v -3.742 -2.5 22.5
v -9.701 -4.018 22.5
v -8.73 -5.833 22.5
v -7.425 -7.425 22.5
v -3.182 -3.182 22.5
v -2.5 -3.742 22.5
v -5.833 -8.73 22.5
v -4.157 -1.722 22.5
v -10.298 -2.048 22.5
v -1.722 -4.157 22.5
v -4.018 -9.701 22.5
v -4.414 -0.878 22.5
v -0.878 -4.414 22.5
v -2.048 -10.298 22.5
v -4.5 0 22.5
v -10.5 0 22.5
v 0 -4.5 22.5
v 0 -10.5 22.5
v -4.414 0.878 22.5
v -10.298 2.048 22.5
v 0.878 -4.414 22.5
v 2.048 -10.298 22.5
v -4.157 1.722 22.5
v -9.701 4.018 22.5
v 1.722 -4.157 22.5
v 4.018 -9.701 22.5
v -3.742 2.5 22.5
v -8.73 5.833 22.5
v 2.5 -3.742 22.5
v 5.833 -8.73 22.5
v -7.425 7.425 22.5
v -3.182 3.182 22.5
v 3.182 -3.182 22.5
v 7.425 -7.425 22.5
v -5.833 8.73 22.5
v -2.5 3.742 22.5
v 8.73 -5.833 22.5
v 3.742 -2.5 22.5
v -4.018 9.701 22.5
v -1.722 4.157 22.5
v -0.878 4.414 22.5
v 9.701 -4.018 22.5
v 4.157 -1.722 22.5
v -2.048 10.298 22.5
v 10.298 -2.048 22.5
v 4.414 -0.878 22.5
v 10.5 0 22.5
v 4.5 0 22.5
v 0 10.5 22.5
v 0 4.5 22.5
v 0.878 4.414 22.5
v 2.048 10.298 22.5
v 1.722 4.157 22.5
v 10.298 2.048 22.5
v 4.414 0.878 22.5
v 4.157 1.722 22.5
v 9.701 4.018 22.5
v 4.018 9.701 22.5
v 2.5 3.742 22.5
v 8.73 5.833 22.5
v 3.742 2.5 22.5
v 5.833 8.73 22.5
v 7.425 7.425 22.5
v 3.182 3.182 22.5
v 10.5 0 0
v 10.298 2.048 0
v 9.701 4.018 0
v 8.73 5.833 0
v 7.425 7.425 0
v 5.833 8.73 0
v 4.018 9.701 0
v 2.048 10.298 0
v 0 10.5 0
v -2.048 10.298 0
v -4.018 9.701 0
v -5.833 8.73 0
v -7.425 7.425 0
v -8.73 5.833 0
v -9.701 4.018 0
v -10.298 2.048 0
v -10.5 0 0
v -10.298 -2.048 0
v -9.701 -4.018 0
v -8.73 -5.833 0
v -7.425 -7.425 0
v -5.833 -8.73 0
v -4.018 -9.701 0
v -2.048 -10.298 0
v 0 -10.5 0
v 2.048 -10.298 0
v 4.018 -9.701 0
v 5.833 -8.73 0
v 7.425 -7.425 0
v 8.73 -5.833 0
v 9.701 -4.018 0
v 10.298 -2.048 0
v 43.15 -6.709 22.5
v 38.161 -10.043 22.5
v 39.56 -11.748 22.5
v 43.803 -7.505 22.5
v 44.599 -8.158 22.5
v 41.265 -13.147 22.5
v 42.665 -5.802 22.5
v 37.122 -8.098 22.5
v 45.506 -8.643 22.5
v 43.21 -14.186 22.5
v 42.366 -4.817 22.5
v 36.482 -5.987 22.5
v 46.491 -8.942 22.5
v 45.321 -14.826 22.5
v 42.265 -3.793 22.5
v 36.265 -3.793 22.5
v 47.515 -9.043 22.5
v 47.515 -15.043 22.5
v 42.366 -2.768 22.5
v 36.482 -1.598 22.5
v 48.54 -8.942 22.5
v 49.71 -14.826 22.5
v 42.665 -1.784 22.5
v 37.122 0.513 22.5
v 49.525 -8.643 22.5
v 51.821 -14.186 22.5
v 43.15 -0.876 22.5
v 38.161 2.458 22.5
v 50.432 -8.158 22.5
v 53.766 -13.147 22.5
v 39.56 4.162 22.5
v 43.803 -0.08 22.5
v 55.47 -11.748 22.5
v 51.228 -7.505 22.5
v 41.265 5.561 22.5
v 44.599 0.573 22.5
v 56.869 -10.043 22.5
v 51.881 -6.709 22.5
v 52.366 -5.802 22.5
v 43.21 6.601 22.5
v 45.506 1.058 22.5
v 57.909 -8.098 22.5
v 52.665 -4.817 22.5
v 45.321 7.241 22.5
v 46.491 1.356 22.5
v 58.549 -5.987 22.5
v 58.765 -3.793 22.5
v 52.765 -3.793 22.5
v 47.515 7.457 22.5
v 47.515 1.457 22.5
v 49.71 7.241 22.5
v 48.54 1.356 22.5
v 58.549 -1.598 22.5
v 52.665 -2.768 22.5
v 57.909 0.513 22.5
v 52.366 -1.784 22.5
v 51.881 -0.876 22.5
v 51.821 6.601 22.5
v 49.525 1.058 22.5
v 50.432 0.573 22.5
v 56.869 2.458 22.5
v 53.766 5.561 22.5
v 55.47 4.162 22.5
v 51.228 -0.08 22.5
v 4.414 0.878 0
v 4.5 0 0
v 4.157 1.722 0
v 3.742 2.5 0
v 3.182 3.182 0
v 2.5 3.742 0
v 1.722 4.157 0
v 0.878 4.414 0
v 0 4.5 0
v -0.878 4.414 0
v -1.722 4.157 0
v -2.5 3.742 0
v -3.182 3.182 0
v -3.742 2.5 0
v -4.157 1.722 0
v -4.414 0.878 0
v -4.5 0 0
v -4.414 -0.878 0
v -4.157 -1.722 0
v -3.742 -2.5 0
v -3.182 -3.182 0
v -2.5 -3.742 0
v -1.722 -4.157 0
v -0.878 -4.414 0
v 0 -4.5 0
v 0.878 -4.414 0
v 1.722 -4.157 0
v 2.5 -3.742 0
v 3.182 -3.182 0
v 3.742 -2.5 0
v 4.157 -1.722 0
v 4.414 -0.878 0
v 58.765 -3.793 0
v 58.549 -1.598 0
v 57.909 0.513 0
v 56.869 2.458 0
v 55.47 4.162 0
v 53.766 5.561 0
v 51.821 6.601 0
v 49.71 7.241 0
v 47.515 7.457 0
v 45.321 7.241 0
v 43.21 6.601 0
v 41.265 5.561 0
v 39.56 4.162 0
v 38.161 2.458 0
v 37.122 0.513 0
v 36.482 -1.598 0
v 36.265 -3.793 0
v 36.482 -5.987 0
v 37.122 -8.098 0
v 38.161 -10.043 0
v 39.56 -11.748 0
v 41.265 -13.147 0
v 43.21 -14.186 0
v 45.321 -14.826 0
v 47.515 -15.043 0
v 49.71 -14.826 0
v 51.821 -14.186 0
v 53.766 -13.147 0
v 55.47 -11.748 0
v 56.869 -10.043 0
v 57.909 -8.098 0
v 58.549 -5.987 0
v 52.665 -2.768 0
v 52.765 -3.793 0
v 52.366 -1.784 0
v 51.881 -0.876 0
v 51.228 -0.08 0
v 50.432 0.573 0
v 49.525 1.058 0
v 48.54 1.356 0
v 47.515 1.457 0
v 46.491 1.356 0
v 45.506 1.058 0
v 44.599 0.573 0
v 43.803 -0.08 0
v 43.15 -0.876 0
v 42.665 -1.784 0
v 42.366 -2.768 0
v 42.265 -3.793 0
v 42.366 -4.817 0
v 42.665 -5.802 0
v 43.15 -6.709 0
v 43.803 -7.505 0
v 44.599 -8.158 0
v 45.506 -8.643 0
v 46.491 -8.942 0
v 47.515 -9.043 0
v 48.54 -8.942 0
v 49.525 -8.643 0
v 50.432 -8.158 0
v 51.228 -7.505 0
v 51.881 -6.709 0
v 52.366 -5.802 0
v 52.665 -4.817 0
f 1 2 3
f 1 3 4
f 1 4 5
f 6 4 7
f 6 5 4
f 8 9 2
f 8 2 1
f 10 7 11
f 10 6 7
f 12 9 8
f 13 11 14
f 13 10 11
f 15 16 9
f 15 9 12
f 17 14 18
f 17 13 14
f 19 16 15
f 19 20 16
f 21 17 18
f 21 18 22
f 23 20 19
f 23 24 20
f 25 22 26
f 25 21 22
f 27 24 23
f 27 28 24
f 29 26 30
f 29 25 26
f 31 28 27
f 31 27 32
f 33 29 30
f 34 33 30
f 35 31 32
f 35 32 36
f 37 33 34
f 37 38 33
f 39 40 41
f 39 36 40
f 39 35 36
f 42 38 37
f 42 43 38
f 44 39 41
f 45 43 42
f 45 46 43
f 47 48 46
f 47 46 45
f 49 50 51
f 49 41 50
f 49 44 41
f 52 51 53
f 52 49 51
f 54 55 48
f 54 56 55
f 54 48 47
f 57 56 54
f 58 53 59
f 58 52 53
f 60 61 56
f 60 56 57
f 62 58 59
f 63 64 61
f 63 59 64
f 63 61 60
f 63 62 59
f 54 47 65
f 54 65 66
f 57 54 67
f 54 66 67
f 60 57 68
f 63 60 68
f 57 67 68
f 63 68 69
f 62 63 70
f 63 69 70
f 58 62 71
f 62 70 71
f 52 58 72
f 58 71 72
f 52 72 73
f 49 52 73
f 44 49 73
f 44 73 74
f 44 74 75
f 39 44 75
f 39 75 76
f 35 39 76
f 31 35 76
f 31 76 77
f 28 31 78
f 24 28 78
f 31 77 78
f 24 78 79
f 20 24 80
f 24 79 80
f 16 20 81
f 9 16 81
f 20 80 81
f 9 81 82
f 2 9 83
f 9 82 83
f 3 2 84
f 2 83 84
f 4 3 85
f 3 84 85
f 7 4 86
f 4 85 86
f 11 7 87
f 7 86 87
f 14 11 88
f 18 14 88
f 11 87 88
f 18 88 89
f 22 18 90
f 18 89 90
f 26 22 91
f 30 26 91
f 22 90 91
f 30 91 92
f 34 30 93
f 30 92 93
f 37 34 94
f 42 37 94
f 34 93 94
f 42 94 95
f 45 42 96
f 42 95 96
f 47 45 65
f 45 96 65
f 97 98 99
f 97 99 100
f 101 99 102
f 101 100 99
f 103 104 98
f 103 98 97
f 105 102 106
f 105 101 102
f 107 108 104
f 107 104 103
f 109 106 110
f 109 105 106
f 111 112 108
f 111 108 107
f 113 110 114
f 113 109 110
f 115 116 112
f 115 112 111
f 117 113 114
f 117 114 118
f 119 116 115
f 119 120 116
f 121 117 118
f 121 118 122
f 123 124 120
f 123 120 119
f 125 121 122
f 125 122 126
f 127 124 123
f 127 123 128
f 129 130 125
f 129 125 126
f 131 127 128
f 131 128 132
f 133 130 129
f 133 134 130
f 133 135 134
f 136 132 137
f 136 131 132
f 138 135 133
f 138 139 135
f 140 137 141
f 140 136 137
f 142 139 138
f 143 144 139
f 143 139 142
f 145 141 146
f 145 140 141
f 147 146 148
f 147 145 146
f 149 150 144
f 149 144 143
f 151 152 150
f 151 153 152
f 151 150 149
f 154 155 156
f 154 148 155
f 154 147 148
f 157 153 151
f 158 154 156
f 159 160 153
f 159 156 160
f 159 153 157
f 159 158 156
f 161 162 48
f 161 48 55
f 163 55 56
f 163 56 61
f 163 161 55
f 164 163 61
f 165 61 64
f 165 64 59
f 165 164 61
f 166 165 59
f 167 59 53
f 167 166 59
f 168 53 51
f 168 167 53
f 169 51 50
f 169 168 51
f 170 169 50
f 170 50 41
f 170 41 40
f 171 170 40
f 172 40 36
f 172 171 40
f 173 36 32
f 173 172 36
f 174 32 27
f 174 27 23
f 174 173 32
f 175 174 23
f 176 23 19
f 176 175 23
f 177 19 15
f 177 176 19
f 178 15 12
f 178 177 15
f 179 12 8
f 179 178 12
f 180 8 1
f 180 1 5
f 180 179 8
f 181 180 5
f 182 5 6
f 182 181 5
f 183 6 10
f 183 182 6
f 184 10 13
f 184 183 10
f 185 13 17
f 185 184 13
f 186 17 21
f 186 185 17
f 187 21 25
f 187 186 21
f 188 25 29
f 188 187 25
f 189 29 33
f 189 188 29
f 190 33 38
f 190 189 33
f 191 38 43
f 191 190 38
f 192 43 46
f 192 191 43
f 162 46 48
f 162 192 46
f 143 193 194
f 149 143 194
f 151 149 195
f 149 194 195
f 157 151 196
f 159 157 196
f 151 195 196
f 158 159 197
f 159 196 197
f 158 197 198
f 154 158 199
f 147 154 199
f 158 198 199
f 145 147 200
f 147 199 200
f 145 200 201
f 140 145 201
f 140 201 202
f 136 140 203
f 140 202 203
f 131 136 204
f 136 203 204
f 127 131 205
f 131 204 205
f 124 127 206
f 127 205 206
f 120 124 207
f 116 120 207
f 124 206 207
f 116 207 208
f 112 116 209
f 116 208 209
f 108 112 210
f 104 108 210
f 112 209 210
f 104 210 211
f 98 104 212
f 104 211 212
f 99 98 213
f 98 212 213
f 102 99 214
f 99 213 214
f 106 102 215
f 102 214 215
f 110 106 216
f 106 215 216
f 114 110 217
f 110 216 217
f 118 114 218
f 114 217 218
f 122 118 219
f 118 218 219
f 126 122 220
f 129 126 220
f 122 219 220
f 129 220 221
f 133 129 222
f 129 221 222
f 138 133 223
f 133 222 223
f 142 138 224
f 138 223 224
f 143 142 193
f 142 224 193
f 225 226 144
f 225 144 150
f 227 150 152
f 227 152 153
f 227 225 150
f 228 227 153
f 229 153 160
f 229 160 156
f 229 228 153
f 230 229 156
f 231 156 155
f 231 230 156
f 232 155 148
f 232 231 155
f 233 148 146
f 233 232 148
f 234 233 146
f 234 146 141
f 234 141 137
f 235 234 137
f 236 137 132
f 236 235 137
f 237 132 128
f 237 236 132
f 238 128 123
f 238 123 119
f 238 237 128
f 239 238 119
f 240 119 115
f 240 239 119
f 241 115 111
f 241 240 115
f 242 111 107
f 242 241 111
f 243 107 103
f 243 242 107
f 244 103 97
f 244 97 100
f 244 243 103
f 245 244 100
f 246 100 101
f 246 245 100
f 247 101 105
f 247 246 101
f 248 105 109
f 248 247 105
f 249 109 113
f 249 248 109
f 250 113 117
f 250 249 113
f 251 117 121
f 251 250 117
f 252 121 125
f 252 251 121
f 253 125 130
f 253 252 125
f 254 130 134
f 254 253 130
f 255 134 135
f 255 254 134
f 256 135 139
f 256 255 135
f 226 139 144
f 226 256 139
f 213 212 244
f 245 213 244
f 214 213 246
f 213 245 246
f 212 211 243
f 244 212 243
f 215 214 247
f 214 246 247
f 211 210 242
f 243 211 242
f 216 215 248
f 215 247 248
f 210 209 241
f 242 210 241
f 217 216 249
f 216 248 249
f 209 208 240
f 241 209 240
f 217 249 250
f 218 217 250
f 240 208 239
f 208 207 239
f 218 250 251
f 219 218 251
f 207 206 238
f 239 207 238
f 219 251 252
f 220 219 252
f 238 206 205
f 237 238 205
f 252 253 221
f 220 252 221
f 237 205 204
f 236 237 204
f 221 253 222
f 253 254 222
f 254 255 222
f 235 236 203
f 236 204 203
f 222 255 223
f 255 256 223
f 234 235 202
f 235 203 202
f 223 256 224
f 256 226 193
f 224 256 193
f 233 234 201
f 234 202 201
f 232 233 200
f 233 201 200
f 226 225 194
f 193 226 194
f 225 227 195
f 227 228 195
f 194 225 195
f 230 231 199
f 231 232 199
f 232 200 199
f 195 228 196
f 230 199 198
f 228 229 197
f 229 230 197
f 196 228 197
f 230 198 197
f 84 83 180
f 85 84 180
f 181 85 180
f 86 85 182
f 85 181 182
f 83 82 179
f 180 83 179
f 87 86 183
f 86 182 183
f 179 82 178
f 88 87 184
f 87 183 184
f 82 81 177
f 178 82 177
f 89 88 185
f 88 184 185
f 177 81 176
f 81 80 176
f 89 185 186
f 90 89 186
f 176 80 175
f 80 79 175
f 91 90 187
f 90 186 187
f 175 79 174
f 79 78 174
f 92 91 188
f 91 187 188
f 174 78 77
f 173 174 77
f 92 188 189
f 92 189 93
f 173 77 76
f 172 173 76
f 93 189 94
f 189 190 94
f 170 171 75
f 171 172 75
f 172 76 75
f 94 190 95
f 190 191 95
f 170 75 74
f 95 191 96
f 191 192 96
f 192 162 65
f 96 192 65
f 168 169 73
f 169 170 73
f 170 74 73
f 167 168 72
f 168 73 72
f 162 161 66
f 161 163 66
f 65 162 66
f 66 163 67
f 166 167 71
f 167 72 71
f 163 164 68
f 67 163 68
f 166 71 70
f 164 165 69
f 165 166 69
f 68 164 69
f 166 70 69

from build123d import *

# Parameters (mm, degrees)
F0_R     = 10.5
F0_R_2   = 4.5
F0_R_3   = 11.25
F0_R_4   = 5.25
F1_DEPTH = 22.5


with BuildPart() as f1:
    # F0 (on Top) → F1 (new body)
    with BuildSketch(Plane.XY):
        Circle(F0_R)
        Circle(F0_R_2, mode=Mode.SUBTRACT)
        with Locations((47.515417, -3.79264)):
            Circle(F0_R_3)
        with Locations((47.515417, -3.79264)):
            Circle(F0_R_4, mode=Mode.SUBTRACT)
    extrude(amount=F1_DEPTH)


solid = f1.part
